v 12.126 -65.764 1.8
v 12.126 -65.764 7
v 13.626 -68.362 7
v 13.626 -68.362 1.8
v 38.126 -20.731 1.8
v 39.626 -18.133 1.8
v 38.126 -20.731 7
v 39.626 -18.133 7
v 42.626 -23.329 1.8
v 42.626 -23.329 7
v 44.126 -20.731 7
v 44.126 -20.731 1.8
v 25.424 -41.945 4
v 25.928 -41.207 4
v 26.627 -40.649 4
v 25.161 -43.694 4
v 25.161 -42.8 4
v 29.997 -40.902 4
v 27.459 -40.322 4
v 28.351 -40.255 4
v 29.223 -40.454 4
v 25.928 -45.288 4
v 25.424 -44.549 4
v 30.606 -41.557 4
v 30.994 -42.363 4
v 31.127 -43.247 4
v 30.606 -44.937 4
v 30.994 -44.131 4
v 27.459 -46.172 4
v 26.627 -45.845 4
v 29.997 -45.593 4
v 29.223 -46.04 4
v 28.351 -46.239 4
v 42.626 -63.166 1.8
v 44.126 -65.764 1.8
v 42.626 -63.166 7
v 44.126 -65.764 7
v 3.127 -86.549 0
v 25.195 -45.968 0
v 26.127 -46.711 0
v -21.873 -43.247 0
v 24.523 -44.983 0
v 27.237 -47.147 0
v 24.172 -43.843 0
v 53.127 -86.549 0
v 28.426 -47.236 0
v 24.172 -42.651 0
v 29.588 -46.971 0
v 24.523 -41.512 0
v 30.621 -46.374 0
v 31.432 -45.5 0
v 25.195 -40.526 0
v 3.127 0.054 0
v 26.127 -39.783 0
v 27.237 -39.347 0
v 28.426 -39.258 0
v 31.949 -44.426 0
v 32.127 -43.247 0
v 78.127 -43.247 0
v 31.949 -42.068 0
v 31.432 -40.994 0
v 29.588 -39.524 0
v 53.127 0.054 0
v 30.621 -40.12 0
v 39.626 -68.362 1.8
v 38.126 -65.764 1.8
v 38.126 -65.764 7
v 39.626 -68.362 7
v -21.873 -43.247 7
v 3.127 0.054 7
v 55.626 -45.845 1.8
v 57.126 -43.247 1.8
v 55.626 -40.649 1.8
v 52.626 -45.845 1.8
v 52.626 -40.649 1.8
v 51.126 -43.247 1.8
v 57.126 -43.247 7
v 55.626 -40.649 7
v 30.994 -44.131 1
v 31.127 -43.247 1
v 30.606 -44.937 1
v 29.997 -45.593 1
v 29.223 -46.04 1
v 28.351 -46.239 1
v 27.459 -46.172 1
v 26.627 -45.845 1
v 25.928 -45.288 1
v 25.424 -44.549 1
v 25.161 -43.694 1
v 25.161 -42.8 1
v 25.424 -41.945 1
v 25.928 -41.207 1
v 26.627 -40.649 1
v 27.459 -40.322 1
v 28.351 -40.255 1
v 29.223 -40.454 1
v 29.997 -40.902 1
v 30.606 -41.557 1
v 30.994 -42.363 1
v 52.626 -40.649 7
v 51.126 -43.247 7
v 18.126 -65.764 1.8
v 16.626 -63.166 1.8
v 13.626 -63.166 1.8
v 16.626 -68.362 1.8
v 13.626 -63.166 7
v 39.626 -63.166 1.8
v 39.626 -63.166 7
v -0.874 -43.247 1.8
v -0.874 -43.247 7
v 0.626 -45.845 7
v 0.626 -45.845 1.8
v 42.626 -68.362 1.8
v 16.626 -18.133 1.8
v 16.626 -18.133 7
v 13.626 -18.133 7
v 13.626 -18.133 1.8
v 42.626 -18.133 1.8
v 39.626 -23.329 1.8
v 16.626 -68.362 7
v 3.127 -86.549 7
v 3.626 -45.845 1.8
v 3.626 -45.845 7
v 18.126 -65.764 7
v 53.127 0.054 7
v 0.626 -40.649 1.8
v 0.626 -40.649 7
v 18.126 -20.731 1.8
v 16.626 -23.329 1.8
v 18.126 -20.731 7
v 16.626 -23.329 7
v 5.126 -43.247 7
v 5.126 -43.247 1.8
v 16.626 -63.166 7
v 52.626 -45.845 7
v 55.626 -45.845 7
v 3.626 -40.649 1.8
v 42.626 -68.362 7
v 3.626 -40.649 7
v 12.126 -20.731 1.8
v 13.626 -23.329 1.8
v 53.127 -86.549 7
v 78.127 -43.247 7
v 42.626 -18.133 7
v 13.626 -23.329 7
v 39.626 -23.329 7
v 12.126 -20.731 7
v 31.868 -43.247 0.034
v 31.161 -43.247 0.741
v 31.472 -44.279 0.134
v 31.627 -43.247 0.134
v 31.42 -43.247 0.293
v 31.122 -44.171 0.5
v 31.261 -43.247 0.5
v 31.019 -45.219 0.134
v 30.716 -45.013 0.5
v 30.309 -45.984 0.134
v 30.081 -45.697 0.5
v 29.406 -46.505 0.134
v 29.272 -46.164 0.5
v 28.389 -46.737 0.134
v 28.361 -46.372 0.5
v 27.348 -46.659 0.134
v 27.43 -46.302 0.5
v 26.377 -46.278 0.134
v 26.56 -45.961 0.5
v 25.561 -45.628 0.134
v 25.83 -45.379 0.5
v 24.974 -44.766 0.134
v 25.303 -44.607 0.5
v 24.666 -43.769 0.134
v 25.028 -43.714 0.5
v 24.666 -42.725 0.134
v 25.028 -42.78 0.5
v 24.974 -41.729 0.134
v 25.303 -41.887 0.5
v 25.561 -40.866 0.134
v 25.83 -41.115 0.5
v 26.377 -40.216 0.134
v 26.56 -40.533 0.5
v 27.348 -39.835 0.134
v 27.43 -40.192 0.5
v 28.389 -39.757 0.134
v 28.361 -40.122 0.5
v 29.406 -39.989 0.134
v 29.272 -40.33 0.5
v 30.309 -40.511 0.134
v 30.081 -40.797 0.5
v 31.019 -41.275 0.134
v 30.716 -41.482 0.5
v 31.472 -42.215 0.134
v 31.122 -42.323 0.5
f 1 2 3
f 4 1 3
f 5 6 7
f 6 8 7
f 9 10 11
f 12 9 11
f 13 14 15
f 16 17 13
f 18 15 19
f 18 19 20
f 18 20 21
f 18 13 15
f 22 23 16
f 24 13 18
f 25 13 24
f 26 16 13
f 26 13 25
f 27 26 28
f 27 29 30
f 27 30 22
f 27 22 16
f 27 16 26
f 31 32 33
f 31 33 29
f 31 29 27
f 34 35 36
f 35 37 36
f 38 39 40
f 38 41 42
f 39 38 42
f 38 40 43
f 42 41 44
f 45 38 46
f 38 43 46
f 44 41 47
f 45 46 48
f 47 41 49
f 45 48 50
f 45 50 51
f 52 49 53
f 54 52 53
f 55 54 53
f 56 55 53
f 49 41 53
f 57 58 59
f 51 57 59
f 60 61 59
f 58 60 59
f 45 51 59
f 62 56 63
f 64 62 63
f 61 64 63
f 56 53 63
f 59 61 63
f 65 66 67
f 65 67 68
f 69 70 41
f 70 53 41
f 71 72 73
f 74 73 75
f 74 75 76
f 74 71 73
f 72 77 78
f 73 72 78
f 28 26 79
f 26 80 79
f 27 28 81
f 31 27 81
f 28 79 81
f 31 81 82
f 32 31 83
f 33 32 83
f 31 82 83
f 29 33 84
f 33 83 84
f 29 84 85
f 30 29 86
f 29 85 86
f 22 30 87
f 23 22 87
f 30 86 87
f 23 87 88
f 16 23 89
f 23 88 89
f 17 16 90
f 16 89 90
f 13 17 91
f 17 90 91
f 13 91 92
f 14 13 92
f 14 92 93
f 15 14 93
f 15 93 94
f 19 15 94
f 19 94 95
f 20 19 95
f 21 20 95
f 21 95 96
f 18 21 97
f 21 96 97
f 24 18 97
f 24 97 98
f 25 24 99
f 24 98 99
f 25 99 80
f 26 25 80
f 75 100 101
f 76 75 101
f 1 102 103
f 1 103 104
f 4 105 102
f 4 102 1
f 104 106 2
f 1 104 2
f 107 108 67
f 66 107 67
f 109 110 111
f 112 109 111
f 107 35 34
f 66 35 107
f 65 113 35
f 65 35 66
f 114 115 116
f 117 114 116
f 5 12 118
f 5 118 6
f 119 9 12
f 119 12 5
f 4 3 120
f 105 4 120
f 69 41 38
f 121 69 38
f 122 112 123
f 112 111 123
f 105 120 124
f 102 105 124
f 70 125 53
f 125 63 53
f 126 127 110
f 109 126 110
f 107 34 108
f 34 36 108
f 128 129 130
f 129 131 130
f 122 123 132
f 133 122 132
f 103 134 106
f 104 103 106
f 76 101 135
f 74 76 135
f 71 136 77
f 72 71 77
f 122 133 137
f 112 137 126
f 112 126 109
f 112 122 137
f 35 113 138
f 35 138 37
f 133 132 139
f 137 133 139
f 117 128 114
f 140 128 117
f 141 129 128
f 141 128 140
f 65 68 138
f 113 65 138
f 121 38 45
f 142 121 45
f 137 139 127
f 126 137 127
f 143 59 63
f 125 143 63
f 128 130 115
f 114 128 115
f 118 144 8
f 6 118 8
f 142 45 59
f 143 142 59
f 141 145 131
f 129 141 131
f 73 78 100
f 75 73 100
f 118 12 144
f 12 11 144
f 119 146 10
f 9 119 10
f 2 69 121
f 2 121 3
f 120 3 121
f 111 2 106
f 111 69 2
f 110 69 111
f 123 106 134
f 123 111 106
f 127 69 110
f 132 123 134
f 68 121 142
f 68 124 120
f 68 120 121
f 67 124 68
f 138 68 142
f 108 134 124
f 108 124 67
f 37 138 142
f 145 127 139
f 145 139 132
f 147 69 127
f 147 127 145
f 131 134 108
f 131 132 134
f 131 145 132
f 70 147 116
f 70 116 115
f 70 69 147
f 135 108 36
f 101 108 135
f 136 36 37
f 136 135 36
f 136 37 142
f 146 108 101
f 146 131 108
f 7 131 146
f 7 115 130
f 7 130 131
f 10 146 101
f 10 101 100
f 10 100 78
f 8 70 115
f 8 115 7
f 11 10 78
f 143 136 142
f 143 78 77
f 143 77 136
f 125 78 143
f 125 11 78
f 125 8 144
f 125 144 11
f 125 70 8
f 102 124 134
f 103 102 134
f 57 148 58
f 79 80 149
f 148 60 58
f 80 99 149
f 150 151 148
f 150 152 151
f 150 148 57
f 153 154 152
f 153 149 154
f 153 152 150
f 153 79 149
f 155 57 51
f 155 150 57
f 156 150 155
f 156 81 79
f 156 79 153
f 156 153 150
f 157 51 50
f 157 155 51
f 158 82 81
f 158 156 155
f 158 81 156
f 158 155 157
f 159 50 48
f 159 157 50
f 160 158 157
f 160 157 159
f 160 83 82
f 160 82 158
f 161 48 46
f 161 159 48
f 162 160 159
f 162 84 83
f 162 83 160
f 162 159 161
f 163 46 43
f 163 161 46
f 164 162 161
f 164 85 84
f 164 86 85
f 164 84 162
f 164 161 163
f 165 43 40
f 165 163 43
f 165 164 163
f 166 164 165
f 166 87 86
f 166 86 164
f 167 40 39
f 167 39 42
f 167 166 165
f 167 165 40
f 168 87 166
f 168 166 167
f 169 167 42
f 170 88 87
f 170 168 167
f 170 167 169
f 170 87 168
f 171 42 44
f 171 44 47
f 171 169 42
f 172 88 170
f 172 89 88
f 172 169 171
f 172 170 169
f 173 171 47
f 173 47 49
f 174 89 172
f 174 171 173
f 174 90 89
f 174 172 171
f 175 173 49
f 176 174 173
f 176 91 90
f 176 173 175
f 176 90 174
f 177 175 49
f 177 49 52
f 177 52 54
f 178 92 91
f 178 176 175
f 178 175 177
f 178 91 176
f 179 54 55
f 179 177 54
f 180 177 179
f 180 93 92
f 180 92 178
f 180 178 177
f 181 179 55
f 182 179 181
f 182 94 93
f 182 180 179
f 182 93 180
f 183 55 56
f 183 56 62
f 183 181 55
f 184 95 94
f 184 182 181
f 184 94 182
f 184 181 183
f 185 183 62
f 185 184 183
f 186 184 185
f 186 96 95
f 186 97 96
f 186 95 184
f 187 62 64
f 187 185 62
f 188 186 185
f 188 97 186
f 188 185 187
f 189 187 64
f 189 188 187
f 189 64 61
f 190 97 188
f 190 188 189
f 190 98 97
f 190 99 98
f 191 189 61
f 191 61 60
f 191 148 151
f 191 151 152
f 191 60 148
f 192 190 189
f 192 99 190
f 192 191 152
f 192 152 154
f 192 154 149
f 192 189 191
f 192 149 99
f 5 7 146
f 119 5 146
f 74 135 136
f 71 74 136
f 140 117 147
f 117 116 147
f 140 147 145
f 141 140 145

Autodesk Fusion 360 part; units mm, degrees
sketch "Sketch1" plane through (0, 0, 0) normal (0, 0, 1) x (1, 0, 0)
  line L0 (3.1266, 0.0539) -> (-21.8734, -43.2474)
  line L1 (-21.8734, -43.2474) -> (3.1266, -86.5486)
  line L2 (3.1266, -86.5486) -> (53.1266, -86.5486)
  line L3 (53.1266, -86.5486) -> (78.1266, -43.2474)
  line L4 (78.1266, -43.2474) -> (53.1266, 0.0539)
  line L5 (53.1266, 0.0539) -> (3.1266, 0.0539)
  point P0 (28.1266, -43.2474)
  dimension "d1" = 50
extrude "Extrude1" add sketch "Sketch1" along normal blind 7
sketch "Sketch2" plane through (0, 0, 7) normal (0, 0, 1) x (-1, 0, 0)
  line L0 (-53.1266, -0.0539) -> (-3.1266, -0.0539)
  line L1 (-3.1266, -0.0539) -> (21.8734, 43.2474)
  line L2 (21.8734, 43.2474) -> (-3.1266, 86.5486)
  line L3 (-3.1266, 86.5486) -> (-53.1266, 86.5486)
  line L4 (-53.1266, 86.5486) -> (-78.1266, 43.2474)
  line L5 (-78.1266, 43.2474) -> (-53.1266, -0.0539)
  line L6 (-13.626, 18.1326) -> (-12.126, 20.7307)
  line L7 (-12.126, 20.7307) -> (-13.626, 23.3288)
  line L8 (-13.626, 23.3288) -> (-16.626, 23.3288)
  line L9 (-16.626, 23.3288) -> (-18.126, 20.7307)
  line L10 (-18.126, 20.7307) -> (-16.626, 18.1326)
  line L11 (-16.626, 18.1326) -> (-13.626, 18.1326)
  line L12 (-44.126, 20.7307) -> (-42.626, 18.1326)
  line L13 (-42.626, 18.1326) -> (-39.626, 18.1326)
  line L14 (-39.626, 18.1326) -> (-38.126, 20.7307)
  line L15 (-38.126, 20.7307) -> (-39.626, 23.3288)
  line L16 (-39.626, 23.3288) -> (-42.626, 23.3288)
  line L17 (-42.626, 23.3288) -> (-44.126, 20.7307)
  line L18 (-44.126, 20.7307) -> (-33.8895, 20.7307) construction
  line L19 (-55.626, 40.6493) -> (-52.626, 40.6493)
  line L20 (-52.626, 40.6493) -> (-51.126, 43.2473)
  line L21 (-51.126, 43.2473) -> (-52.626, 45.8454)
  line L22 (-52.626, 45.8454) -> (-55.626, 45.8454)
  line L23 (-55.626, 45.8454) -> (-57.126, 43.2473)
  line L24 (-57.126, 43.2473) -> (-55.626, 40.6493)
  line L25 (-55.626, 40.6493) -> (-56.8973, 40.6493) construction
  line L26 (-38.126, 65.764) -> (-39.626, 68.3621)
  line L27 (-39.626, 68.3621) -> (-42.626, 68.3621)
  line L28 (-42.626, 68.3621) -> (-44.126, 65.764)
  line L29 (-44.126, 65.764) -> (-42.626, 63.1659)
  line L30 (-42.626, 63.1659) -> (-39.626, 63.1659)
  line L31 (-39.626, 63.1659) -> (-38.126, 65.764)
  line L32 (-38.126, 65.764) -> (-41.1962, 65.764) construction
  line L33 (-13.626, 63.1659) -> (-12.126, 65.764)
  line L34 (-12.126, 65.764) -> (-13.626, 68.3621)
  line L35 (-13.626, 68.3621) -> (-16.626, 68.3621)
  line L36 (-16.626, 68.3621) -> (-18.126, 65.764)
  line L37 (-18.126, 65.764) -> (-16.626, 63.1659)
  line L38 (-16.626, 63.1659) -> (-13.626, 63.1659)
  line L39 (-13.626, 63.1659) -> (5.8693, 63.1659) construction
  line L40 (-0.626, 40.6493) -> (0.874, 43.2473)
  line L41 (0.874, 43.2473) -> (-0.626, 45.8454)
  line L42 (-0.626, 45.8454) -> (-3.626, 45.8454)
  line L43 (-3.626, 45.8454) -> (-5.126, 43.2473)
  line L44 (-5.126, 43.2473) -> (-3.626, 40.6493)
  line L45 (-3.626, 40.6493) -> (-0.626, 40.6493)
  line L46 (-0.626, 40.6493) -> (25.3601, 40.6493) construction
  point P0 (-15.126, 20.7307)
  point P1 (-41.126, 20.7307)
  point P2 (-54.126, 43.2473)
  point P3 (-41.126, 65.764)
  point P4 (-15.126, 65.764)
  point P5 (-2.126, 43.2473)
  dimension "d4" = 3
  dimension "d5" = 60
  dimension "d6" = 3
  dimension "d7" = 60
  dimension "d8" = 3
  dimension "d9" = 60
  dimension "d10" = 3
  dimension "d11" = 60
  dimension "d12" = 3
  dimension "d13" = 60
  dimension "d15" = 20
  dimension "d16" = 20
  dimension "d17" = 20
  dimension "d20" = 3
  dimension "d21" = 20
  dimension "d22" = 20
  dimension "d23" = 20
  dimension "d26" = 18.1865
  dimension "d27" = 18.1866
  dimension "d28" = 18.187
  dimension "d29" = 18.187
extrude "Extrude2" cut sketch "Sketch2" against normal blind 5.2 contours L6 L7 L8 L9 L10 L11 | L12 L13 L14 L15 L16 L17 | L19 L20 L21 L22 L23 L24 | L26 L27 L28 L29 L30 L31 | L33 L34 L35 L36 L37 L38 | L40 L41 L42 L43 L44 L45
sketch "Sketch4" plane through (0, 0, 0) normal (0, 0, -1) x (1, 0, 0)
  line L0 (3.1266, -0.0539) -> (53.1266, -0.0539)
  line L1 (53.1266, -0.0539) -> (78.1266, 43.2474)
  line L2 (78.1266, 43.2474) -> (53.1266, 86.5486)
  line L3 (53.1266, 86.5486) -> (3.1266, 86.5486)
  line L4 (3.1266, 86.5486) -> (-21.8734, 43.2474)
  line L5 (-21.8734, 43.2474) -> (3.1266, -0.0539)
  circle A0 centre (28.127, 43.2471) radius 3
  dimension "d38" = 6
  dimension "d39" = 43.3015
  dimension "d40" = 43.3015
  dimension "d41" = 43.3008
extrude "Extrude4" cut sketch "Sketch4" against normal blind 4 contours A0
fillet "Fillet1" radius 1 1 edges at (25.33, -44.332, 0)
